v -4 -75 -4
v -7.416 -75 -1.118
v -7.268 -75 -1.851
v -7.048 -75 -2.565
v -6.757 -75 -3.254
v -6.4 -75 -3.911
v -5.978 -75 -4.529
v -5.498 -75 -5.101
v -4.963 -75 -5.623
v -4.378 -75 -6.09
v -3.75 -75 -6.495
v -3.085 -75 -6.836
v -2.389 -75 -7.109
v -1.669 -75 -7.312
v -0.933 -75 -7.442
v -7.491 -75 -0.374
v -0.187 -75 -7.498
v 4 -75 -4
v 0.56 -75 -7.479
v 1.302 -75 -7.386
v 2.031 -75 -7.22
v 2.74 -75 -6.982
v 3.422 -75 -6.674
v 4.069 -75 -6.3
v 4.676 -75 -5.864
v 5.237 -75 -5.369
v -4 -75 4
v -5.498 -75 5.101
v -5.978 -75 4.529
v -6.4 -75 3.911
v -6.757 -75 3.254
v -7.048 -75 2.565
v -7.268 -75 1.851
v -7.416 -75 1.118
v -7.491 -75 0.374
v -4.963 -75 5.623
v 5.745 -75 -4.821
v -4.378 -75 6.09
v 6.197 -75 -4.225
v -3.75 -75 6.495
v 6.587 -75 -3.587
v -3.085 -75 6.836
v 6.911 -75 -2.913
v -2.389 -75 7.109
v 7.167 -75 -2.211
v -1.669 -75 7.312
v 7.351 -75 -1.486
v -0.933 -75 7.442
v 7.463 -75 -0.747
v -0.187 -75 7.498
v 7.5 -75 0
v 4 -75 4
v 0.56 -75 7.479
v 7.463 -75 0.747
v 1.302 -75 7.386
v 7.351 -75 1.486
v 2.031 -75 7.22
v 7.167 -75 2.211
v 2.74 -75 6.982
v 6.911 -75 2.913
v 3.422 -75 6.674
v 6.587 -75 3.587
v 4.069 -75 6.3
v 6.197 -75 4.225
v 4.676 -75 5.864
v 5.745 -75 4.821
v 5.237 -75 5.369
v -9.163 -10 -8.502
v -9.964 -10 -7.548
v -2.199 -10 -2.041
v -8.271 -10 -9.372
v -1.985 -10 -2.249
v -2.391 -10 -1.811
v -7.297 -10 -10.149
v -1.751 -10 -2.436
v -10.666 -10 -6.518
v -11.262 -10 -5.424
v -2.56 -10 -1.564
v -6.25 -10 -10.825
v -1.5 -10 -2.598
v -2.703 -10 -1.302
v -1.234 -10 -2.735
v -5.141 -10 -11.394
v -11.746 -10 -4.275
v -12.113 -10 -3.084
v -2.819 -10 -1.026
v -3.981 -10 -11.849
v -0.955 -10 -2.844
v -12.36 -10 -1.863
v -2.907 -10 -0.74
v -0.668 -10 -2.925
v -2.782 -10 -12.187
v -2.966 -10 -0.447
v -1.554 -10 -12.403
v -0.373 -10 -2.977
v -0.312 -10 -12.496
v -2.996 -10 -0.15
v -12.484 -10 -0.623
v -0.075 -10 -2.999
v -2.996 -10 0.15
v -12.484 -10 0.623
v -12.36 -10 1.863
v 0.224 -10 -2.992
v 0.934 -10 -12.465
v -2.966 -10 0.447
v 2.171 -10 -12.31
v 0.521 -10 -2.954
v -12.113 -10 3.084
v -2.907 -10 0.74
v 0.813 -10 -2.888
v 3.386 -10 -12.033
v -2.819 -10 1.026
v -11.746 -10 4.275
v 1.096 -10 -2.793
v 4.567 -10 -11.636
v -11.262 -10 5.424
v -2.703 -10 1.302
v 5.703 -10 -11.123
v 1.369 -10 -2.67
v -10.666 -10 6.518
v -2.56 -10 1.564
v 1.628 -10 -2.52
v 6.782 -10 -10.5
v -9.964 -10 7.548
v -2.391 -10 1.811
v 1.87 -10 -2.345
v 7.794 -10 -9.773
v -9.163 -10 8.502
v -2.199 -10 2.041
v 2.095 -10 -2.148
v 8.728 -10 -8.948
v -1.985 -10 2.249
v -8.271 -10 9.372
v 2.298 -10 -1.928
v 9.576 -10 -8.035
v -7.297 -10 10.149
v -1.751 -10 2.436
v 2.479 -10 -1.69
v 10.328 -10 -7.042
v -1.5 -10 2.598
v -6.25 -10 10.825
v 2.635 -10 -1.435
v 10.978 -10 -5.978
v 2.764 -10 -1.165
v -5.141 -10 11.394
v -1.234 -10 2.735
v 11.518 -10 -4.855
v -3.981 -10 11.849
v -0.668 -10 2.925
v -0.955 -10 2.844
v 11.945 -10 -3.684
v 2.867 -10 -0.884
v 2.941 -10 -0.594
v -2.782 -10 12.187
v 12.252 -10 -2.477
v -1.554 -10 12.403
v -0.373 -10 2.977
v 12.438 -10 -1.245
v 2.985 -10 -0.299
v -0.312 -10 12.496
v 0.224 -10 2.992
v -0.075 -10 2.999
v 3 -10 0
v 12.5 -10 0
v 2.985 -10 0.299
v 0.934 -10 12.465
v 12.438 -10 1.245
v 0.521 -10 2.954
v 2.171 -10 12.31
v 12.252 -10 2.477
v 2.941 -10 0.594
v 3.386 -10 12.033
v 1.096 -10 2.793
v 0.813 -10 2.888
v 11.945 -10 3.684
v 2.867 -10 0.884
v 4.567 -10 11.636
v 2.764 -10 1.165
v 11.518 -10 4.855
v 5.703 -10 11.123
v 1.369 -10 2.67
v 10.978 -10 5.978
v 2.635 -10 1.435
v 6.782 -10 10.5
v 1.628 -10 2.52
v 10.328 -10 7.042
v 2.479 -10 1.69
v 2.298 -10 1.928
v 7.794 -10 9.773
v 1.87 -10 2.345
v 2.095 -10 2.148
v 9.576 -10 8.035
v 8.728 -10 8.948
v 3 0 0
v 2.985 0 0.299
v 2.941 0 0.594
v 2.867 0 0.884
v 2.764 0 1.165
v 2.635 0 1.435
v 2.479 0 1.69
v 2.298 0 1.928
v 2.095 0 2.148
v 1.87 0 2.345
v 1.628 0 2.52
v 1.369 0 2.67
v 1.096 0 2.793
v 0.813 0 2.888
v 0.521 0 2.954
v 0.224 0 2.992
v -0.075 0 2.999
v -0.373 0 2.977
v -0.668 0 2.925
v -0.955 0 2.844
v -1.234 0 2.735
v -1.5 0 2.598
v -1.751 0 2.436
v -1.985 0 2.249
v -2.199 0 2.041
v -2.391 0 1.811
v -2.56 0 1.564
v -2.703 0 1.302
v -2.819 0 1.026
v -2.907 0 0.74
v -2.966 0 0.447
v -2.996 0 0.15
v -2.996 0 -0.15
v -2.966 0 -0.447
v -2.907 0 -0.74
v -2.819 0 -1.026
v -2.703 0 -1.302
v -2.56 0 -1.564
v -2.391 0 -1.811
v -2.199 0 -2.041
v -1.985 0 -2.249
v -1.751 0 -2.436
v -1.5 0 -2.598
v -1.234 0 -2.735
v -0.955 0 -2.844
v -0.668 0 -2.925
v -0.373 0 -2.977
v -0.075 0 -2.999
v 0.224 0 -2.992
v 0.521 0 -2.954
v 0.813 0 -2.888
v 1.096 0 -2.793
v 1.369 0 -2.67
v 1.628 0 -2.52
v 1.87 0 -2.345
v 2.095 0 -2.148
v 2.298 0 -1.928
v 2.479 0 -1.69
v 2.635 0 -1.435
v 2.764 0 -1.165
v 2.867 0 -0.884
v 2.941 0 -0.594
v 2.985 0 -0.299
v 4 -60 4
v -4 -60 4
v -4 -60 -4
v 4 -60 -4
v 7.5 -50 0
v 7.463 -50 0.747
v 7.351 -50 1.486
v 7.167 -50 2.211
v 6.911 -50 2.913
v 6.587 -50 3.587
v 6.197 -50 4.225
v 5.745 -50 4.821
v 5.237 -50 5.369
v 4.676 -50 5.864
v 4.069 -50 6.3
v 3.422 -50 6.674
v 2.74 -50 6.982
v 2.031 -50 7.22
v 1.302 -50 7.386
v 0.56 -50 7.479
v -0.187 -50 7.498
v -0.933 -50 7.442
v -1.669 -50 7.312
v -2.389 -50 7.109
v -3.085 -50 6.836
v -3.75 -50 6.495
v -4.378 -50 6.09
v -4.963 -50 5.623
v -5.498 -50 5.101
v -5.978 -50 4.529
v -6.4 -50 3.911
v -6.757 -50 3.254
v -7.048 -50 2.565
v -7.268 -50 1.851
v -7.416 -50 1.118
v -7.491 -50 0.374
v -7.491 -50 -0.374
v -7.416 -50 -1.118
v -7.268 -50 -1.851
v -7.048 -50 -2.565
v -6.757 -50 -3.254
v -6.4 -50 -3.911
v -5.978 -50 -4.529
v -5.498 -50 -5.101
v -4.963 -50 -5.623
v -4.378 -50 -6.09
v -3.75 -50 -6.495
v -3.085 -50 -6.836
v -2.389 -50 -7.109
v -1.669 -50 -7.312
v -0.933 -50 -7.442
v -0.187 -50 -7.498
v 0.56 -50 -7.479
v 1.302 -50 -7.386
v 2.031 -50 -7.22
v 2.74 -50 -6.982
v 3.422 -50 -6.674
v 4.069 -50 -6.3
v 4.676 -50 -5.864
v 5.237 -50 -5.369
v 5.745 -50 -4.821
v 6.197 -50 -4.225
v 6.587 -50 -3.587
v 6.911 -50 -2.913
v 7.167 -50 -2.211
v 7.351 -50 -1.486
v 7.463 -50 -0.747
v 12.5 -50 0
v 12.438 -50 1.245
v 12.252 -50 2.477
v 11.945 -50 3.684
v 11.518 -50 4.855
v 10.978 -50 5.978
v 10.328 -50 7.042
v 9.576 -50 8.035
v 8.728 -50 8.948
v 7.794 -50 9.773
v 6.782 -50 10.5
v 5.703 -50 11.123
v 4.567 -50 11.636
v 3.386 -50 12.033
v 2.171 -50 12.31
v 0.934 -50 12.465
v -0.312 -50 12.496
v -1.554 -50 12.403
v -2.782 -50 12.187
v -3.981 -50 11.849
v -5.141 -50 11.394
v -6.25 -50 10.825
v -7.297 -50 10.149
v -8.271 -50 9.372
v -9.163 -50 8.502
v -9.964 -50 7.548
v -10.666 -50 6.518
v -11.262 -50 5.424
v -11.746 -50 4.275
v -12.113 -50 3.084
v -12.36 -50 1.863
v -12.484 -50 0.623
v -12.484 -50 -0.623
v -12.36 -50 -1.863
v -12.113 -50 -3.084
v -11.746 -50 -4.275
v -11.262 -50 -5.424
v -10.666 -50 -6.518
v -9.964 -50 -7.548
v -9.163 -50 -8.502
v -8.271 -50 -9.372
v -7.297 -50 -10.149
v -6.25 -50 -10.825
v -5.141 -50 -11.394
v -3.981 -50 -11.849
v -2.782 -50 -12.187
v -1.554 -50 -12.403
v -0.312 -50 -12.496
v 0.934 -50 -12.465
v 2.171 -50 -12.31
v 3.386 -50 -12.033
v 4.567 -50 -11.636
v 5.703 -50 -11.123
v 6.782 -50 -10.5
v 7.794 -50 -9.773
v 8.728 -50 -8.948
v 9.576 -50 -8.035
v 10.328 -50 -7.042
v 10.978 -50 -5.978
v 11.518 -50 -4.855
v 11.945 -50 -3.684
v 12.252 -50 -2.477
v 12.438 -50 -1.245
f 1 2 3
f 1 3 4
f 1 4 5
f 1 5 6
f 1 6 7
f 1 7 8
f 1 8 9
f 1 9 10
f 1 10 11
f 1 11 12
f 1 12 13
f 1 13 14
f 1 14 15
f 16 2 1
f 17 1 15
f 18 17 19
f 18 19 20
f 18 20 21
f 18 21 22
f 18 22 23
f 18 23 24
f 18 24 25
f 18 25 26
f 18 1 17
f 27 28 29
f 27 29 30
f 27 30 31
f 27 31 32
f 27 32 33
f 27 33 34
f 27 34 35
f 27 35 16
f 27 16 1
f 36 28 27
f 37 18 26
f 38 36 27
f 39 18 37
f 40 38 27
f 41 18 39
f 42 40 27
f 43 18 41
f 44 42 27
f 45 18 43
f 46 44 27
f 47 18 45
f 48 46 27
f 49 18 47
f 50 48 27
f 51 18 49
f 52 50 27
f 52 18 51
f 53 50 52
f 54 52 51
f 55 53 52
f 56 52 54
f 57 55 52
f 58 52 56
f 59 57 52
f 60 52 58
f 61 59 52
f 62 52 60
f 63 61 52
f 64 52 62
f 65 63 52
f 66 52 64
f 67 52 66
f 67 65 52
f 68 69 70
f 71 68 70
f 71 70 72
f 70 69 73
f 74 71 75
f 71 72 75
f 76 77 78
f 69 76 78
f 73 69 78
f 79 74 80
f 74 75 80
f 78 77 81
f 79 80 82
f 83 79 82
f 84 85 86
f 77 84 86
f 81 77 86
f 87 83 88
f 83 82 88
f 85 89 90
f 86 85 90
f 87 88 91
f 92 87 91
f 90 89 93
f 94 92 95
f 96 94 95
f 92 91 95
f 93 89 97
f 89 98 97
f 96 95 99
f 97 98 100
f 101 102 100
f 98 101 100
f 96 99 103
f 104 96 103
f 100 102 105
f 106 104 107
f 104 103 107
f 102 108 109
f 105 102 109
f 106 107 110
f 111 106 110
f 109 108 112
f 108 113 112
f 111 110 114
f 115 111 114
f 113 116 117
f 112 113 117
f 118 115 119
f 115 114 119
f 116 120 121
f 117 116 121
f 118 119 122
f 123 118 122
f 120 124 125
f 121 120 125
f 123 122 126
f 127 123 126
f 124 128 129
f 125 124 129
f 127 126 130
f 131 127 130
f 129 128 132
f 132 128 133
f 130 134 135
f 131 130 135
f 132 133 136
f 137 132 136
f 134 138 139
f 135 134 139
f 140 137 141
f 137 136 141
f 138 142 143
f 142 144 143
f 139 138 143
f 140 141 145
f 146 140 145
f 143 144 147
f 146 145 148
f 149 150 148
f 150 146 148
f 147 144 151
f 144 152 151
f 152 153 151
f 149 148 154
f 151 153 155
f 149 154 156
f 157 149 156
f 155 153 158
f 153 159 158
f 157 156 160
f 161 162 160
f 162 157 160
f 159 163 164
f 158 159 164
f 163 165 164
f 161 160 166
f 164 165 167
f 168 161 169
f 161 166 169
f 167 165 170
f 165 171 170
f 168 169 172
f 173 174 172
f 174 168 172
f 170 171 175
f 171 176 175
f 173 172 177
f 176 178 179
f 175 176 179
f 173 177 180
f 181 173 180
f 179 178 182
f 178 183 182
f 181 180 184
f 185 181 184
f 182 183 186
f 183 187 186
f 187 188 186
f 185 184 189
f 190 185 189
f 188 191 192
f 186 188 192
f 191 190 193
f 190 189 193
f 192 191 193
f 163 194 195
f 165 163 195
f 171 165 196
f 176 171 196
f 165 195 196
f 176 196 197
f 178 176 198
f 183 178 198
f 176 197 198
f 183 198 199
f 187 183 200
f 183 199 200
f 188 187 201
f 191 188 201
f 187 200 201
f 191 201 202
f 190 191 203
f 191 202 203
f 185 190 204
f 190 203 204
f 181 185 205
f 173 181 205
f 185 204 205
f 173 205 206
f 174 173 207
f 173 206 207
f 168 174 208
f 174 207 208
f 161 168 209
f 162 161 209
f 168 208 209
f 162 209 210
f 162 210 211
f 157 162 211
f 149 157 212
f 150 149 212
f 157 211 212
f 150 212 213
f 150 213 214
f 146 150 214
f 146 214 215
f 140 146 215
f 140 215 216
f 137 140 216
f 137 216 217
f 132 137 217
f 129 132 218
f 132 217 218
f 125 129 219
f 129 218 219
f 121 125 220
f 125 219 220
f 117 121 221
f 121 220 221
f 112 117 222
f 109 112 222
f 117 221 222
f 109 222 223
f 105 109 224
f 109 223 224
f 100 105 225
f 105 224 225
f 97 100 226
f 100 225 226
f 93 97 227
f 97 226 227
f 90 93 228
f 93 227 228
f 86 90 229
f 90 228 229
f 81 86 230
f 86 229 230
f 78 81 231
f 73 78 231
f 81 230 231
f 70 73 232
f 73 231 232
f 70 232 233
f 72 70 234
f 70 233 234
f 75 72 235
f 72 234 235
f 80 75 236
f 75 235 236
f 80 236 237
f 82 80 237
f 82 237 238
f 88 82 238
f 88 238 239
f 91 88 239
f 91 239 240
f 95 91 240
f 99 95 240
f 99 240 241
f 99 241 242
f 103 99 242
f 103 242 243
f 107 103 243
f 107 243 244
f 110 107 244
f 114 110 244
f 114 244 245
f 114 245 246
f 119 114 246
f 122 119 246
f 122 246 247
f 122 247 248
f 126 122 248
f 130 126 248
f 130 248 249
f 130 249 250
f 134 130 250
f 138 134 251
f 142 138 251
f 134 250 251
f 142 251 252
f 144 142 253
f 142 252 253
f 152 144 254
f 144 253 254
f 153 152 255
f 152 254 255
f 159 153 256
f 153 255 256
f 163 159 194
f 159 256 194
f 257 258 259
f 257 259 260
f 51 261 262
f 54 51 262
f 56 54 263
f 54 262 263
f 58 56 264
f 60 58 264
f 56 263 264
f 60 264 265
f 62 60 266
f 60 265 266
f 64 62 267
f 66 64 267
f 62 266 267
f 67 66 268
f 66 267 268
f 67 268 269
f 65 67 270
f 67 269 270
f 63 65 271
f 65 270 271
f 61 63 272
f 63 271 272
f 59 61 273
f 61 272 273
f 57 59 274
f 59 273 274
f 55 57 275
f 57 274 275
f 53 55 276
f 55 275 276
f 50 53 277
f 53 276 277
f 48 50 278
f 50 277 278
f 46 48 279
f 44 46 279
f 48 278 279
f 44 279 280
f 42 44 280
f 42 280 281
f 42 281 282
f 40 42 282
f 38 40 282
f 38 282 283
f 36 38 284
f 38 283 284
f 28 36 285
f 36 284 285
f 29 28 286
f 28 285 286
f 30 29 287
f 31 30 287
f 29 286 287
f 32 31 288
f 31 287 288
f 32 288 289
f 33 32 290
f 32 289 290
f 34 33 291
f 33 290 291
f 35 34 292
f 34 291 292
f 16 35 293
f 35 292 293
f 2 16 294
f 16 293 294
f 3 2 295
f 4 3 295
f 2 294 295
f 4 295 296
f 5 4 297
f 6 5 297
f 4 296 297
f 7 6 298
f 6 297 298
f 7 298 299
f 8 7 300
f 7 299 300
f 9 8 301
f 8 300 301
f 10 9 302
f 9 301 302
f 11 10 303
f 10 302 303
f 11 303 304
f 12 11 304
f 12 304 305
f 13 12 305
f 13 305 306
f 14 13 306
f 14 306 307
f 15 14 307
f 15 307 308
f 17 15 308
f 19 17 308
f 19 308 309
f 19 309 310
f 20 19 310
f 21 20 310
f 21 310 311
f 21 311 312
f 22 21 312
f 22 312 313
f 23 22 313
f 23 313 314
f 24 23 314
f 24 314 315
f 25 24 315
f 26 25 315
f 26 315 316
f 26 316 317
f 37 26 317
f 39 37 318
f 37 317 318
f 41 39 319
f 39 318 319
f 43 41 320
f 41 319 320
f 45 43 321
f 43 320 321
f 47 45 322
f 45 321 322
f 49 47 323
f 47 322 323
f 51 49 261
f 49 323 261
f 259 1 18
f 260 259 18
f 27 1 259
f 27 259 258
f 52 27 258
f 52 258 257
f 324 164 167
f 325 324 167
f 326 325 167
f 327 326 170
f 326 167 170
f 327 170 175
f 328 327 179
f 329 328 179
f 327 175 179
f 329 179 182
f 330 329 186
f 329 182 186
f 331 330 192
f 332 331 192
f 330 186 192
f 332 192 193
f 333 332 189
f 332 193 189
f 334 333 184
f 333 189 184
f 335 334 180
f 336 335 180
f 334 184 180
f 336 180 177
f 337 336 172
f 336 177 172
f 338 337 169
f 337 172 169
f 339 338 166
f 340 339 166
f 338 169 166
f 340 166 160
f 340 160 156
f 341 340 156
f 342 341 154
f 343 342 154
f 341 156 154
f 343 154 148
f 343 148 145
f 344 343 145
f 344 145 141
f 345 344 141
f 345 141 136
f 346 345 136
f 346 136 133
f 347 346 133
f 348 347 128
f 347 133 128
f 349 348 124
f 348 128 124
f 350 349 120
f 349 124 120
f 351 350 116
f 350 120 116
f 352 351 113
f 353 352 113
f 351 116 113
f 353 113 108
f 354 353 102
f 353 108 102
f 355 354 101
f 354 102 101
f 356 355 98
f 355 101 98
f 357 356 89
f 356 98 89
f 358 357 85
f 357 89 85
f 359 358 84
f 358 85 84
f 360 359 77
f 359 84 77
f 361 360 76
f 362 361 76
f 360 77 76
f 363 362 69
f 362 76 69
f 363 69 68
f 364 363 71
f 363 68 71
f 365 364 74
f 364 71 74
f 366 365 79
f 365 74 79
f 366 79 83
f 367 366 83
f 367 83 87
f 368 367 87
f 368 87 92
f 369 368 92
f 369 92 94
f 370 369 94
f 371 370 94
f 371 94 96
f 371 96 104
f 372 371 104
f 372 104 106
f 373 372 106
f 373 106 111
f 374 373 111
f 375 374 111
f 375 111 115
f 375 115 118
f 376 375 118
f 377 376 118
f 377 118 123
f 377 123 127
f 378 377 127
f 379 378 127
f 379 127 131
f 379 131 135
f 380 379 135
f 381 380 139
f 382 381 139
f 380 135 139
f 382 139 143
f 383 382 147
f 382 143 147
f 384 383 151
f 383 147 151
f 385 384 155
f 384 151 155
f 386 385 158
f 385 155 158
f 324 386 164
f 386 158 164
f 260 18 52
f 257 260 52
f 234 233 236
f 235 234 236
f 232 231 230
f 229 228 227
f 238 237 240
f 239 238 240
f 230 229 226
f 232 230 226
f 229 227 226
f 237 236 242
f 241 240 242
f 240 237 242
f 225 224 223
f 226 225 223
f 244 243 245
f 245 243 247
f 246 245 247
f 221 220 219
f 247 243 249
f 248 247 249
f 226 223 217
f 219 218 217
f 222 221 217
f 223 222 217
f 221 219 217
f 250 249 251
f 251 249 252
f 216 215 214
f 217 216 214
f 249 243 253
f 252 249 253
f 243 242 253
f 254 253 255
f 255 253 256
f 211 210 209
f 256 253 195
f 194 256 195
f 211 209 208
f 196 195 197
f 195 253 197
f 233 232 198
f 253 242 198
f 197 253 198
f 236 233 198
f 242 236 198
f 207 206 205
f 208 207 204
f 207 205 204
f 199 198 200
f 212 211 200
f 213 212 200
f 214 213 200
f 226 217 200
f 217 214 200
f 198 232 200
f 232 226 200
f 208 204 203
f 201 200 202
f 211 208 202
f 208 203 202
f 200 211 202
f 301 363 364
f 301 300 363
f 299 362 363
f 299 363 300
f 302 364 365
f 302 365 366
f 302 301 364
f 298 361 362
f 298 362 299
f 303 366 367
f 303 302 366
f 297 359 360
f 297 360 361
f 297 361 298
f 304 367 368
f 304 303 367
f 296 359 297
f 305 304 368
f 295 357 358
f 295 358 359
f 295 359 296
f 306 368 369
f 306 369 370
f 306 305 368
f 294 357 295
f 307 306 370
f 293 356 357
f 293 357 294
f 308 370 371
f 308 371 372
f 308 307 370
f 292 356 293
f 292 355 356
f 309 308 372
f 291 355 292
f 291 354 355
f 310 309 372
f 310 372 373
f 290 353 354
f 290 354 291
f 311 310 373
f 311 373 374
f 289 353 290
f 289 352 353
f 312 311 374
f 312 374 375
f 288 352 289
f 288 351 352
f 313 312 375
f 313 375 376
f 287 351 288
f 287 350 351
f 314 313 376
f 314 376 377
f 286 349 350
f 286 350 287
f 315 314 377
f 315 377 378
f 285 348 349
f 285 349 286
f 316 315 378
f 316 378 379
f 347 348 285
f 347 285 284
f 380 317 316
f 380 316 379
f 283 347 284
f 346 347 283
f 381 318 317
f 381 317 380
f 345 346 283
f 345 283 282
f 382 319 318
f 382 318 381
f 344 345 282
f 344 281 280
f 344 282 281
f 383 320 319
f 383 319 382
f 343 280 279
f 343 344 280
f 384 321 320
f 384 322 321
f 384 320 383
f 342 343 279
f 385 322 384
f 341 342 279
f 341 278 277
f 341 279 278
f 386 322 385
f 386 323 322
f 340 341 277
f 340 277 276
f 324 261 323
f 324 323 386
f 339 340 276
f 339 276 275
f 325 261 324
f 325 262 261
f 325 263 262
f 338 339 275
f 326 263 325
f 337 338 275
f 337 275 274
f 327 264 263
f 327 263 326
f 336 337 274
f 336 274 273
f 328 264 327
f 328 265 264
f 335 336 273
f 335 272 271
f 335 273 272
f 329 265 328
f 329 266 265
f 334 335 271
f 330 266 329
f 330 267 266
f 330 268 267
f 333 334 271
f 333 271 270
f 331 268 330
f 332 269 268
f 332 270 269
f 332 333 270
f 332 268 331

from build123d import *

# Parameters (mm, degrees)
F0_R     = 3
F1_DEPTH = 10
F2_R     = 12.5
F2_R_2   = 3
F3_DEPTH = 40
F4_R     = 7.5
F5_DEPTH = 25
F6_W     = 8
F6_H     = 8
F7_DEPTH = 15


with BuildPart() as f1:
    # F0 (on Front) → F1 (new body)
    with BuildSketch(Plane.XZ):
        Circle(F0_R)
    extrude(amount=F1_DEPTH)

    # F2 (on face) → F3 (join)
    with BuildSketch(Plane.XZ.offset(10)):
        Circle(F2_R)
        Circle(F2_R_2, mode=Mode.SUBTRACT)
        Circle(F2_R_2)
    extrude(amount=F3_DEPTH)

    # F4 (on face) → F5 (join)
    with BuildSketch(Plane.XZ.offset(50)):
        Circle(F4_R)
    extrude(amount=F5_DEPTH)

    # F6 (on face) → F7 (cut)
    with BuildSketch(Plane.XZ.offset(75)):
        Rectangle(F6_W, F6_H)
    extrude(amount=-F7_DEPTH, mode=Mode.SUBTRACT)


solid = f1.part
